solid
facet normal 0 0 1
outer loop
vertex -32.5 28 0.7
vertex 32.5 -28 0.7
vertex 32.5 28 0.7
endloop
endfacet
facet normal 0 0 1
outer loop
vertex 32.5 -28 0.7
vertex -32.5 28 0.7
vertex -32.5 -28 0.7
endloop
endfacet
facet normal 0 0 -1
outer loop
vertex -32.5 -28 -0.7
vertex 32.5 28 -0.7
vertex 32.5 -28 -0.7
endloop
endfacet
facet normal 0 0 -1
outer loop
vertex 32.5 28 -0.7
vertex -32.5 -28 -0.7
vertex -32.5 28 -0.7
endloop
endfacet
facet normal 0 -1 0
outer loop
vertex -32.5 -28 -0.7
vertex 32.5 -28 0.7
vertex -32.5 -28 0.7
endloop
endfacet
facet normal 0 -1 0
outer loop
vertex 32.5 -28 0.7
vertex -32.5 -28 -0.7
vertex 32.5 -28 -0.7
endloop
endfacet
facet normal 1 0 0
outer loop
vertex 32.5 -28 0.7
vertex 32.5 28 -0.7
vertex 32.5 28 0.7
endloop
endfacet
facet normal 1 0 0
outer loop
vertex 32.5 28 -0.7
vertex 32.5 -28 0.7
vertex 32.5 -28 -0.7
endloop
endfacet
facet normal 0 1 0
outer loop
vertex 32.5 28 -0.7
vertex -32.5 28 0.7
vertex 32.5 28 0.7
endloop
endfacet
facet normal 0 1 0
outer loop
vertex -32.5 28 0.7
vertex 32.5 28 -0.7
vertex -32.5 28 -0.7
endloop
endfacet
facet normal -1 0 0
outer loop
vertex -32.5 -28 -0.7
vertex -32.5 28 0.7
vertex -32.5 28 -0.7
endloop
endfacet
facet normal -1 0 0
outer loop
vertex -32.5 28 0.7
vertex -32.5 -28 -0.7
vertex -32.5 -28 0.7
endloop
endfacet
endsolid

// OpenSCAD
// Parameters
pcb_length = 65; //[32.5:130:0.1]
pcb_width = 56; //[28:112:0.1]
pcb_thickness = 1.4; //[0.7:2.8:0.1]

// PCB Main Body
module pcb_main_body() {
  color([0.0, 0.4, 0.2]) // Green color for PCB
  translate([0, 0, 0])
    cube([pcb_length, pcb_width, pcb_thickness], center=true);
}

// Complete PCB Model
module pcb_complete_model() {
  union() {
    pcb_main_body();
  }
}

// Render the final output
pcb_complete_model();
